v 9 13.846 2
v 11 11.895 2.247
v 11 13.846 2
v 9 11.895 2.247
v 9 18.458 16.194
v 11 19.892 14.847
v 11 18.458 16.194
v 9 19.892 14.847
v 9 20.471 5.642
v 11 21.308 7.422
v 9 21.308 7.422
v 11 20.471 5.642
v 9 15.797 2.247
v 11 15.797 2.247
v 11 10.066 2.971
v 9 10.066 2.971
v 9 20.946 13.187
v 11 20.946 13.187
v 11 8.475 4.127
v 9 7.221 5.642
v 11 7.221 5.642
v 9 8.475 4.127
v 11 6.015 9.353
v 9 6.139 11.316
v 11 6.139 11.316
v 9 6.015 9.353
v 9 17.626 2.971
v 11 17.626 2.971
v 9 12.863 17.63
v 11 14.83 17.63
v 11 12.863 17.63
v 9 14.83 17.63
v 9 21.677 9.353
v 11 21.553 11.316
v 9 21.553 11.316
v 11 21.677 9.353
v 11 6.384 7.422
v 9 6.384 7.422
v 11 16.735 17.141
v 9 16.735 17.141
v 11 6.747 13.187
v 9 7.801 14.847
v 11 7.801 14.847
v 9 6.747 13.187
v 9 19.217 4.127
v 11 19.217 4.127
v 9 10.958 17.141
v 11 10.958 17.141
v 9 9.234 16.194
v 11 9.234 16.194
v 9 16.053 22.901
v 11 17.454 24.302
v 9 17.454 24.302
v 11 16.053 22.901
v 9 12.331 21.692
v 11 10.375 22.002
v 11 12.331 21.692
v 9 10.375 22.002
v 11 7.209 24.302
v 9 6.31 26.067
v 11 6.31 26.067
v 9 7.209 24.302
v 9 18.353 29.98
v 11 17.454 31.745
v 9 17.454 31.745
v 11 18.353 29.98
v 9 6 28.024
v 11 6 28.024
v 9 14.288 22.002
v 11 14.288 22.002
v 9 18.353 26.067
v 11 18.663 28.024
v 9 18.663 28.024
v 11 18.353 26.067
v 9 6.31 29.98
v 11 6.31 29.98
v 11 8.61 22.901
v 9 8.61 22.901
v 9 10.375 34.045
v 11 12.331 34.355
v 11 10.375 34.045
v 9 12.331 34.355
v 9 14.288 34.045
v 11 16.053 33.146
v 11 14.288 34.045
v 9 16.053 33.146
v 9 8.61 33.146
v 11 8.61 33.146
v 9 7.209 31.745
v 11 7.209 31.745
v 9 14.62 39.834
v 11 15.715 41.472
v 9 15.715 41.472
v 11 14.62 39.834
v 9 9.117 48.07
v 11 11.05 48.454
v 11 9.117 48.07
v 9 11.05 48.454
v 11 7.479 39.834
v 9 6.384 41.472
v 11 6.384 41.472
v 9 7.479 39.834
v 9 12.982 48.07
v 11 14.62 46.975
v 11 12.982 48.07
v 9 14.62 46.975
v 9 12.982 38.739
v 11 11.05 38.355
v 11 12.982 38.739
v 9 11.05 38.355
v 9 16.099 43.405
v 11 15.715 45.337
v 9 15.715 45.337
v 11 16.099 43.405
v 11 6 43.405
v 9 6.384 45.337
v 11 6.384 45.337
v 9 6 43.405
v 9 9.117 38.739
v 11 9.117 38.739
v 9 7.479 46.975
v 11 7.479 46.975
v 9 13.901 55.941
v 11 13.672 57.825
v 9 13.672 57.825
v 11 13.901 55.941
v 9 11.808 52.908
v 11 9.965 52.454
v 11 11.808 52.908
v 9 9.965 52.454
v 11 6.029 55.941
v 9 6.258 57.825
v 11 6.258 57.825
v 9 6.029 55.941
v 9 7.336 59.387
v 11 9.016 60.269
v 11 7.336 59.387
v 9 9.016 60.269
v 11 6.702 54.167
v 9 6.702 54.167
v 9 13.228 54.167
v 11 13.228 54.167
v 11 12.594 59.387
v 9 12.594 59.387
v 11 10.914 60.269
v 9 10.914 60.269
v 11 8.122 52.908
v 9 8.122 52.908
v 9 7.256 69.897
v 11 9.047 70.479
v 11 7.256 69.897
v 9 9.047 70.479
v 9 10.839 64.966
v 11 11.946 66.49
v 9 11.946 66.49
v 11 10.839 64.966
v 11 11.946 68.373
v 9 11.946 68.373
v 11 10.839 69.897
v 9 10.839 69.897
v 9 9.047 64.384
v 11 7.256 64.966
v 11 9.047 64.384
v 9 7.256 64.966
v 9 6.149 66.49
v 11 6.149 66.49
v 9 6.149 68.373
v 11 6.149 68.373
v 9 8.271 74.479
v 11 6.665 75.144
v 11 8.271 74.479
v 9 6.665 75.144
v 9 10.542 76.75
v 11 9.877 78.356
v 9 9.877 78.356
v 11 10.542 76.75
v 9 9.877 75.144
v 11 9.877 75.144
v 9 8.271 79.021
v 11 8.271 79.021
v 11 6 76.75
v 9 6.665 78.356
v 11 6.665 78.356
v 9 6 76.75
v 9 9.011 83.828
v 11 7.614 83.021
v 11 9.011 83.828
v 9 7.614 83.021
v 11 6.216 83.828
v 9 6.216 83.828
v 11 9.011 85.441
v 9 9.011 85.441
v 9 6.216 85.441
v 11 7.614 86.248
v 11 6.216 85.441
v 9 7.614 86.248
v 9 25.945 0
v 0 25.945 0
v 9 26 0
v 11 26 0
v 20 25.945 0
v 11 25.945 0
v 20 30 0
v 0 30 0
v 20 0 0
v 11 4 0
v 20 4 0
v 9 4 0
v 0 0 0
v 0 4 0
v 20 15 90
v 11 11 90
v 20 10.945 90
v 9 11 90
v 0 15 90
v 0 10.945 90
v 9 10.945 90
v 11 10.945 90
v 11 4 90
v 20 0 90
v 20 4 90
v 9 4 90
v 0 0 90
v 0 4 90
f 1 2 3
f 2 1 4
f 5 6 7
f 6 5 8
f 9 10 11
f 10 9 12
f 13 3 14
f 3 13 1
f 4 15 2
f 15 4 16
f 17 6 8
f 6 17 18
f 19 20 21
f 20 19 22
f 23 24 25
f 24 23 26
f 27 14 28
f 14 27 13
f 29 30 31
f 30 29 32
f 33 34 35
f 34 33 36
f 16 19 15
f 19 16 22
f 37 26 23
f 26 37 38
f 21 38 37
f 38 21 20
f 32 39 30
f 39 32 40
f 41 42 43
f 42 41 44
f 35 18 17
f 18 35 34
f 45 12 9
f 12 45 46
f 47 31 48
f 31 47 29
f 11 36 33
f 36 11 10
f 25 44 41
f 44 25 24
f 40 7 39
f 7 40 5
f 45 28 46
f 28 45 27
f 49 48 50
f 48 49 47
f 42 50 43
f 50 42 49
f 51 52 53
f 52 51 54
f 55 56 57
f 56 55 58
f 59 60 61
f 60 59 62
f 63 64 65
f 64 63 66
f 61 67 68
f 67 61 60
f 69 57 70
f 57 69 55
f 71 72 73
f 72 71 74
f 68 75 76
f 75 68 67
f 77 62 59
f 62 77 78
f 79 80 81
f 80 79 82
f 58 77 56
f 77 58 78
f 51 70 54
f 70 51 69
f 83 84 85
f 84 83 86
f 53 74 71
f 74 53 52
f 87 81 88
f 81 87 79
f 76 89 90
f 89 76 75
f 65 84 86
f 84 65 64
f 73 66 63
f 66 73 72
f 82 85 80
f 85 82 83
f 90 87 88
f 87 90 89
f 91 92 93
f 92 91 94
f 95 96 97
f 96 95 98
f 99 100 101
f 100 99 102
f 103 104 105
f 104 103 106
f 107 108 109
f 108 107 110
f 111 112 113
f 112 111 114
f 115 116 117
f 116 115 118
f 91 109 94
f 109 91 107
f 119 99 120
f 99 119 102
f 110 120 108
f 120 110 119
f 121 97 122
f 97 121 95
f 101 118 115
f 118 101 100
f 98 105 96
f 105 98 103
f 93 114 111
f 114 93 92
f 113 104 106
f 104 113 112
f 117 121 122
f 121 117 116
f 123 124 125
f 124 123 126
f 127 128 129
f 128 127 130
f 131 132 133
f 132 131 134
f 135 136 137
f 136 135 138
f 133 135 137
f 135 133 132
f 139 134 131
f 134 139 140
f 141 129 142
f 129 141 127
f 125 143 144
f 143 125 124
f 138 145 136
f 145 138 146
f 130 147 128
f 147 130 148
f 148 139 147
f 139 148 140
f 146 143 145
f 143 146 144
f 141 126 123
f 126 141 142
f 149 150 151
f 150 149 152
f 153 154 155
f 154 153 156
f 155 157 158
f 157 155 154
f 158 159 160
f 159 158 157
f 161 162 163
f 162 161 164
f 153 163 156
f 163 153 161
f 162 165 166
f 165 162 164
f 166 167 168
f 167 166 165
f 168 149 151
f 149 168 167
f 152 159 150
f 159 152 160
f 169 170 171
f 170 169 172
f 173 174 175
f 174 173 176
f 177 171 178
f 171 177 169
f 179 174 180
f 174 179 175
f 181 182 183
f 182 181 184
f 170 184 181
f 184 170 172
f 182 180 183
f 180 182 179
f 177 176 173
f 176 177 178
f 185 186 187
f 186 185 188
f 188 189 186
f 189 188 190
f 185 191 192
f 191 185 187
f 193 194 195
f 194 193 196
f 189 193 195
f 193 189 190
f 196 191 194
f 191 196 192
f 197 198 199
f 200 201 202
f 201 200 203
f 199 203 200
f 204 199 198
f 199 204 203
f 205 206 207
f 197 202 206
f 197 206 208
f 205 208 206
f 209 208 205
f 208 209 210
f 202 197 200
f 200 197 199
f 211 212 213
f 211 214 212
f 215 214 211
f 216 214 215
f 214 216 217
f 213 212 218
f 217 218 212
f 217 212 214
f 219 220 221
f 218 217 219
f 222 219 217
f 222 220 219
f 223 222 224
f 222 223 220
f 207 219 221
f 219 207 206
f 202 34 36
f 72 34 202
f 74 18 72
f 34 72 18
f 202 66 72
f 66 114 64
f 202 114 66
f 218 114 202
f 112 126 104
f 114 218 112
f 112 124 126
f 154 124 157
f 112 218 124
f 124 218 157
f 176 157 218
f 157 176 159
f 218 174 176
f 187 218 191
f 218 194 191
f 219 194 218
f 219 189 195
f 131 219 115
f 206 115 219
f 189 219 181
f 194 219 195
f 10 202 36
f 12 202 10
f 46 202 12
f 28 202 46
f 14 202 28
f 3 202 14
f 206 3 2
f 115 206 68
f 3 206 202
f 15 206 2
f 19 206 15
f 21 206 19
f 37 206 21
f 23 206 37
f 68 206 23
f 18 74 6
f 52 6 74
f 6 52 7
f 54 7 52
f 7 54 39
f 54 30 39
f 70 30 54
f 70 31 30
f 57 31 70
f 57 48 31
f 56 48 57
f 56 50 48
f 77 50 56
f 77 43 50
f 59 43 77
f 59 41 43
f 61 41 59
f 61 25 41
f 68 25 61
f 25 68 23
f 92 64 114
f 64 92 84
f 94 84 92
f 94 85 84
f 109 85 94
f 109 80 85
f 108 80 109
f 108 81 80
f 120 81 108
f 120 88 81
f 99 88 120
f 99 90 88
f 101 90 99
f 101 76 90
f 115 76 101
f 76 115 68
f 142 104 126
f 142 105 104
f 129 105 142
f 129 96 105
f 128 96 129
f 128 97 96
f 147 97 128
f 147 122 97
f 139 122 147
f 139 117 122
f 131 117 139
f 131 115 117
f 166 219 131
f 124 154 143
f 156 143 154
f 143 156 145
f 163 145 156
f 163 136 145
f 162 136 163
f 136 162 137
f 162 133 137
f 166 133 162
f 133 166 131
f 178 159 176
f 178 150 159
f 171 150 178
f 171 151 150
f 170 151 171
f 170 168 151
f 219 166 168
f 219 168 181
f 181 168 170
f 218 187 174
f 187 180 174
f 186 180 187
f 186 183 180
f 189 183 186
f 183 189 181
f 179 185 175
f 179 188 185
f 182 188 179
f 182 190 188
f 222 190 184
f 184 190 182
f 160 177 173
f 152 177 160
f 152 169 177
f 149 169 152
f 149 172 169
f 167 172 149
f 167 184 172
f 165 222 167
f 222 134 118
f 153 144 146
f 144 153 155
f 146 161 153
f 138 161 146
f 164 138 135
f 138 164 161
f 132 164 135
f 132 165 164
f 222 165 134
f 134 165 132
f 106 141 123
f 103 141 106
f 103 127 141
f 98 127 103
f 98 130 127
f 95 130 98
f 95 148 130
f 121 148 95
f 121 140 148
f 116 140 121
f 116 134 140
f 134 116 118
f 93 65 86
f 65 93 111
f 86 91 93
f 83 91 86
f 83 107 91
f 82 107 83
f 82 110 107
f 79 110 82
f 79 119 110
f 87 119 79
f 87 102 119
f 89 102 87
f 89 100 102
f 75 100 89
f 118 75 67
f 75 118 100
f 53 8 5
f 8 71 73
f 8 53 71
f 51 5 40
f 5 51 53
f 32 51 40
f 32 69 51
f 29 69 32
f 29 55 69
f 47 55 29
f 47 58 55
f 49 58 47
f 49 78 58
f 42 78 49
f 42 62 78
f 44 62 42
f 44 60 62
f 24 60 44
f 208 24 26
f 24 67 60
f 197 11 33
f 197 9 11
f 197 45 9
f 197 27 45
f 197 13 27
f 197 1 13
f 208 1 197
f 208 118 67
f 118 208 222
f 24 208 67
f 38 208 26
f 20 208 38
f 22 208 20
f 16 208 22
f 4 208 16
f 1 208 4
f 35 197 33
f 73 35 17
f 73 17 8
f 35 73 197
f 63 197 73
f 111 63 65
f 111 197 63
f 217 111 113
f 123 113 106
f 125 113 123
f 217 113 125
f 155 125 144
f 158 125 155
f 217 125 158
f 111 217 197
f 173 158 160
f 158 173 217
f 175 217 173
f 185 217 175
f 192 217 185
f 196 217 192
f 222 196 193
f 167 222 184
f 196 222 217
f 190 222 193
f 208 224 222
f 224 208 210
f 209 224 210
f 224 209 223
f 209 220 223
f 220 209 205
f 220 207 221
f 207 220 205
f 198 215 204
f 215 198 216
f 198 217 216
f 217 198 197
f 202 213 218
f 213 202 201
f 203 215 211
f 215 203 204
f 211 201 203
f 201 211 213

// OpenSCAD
module landingStrut(length, widthInitial, widthFinal, height, flangeWidth=4, webWidth=2, webCircles=false, gapWallCircles=2, gapBetweenCircles=2) {
   
   // This function recusively creates the coordinates needed to create the
   // circles that will be cut out of the webWidth.
   // m is the slope of the angled flangeWidth
   m = (widthInitial - widthFinal) / height;
   function circles(ws) =
   let (
      r = (widthInitial - m * ws - m * gapBetweenCircles - 2 * gapWallCircles) / (2 + m) -  flangeWidth
      ,x = r + gapBetweenCircles + ws
      ,ws = ws + 2 * gapBetweenCircles + 2 * r
   ) 
   (ws > height ? [[r, x, ws]] : concat([[r, x, ws]], circles(ws)));
   
   // Calculations for the second flangeWidth
   flangeWidth2Length = sqrt(pow(height, 2) + pow((widthInitial - widthFinal), 2));
   flangeWidth2Angle = acos(height / flangeWidth2Length);
   makeup = flangeWidth * tan(flangeWidth2Angle);
   
   // Put the bottome left corner at the origin
   translate([length / 2, 0, 0])
   
   // flangeWidth 2 union
   union(){
      // flangeWidth 2 cut away
      // This difference is removing the material from the webWidth for 
      // the angled second flangeWidth.
      difference() {
         // flangeWidth 1 and webWidth
         // This block draws the first flangeWidth and the webWidth as a 2d projection
         // and then extrudes them to the proper height
         linear_extrude(height)
         union() {

            // webWidth
            translate([-webWidth / 2, 0])
            square([webWidth, widthInitial]);

            // flangeWidth 1
            translate([-length / 2, 0])
            square([length, flangeWidth]);
         };
         
         // This is the subtraction block for the angled second flangeWidth
         translate([-length, widthInitial - flangeWidth, 0])
         rotate(flangeWidth2Angle, [1, 0, 0])
         translate([0, 0, -flangeWidth2Length / 2])
         cube([length * 2, widthInitial, flangeWidth2Length * 2]);
         
         // This block will remove material from the webWidth by
         // creating and array of circles that are then subtracted
         // These circles will appear offset from flangeWidth one by the 
         // value of gapWallCircles
         if (webCircles) {
            for (i = circles(0)) {
               let(
                   r = i[0]
                   , xT = -length / 2
                   , yT = r + gapWallCircles + flangeWidth
                   , zT = i[1]
               )
               translate([xT, yT , zT])
               rotate(90, [0, 1, 0])
               cylinder(r=r, h=length);
            }
         }
      
      }
      
      // flangeWidth 2
      // This is the angled second flangeWidth.
      // Because the second flangeWidth is created as a cube and then 
      // rotated the edges of the cube now extend above and below the 
      // ends of the existing webWidth and flangeWidth. Two additional cubes are 
      // created to remove this excess material and make the top and 
      // bottom of the flangeWidth flush with the webWidth and flangeWidth 1.
      difference() {
         translate([-length / 2, widthInitial, 0])
         rotate(flangeWidth2Angle, [1, 0, 0])
         translate([0, -flangeWidth, 0])
         cube([length, flangeWidth, flangeWidth2Length + makeup]);
         
         // These two cubes are used to remove the excess material 
         // Bottom cube
         translate([-length, -widthInitial / 4, -makeup *2])
         cube([length * 2, widthInitial * 2, makeup * 2]);
         // Top cube
         translate([-length, -widthInitial / 4, height])
         cube([length * 2, widthInitial * 2, makeup * 2]);
      }
   }   
};


landingStrut(20, 30, 15, 90, webCircles=true);
